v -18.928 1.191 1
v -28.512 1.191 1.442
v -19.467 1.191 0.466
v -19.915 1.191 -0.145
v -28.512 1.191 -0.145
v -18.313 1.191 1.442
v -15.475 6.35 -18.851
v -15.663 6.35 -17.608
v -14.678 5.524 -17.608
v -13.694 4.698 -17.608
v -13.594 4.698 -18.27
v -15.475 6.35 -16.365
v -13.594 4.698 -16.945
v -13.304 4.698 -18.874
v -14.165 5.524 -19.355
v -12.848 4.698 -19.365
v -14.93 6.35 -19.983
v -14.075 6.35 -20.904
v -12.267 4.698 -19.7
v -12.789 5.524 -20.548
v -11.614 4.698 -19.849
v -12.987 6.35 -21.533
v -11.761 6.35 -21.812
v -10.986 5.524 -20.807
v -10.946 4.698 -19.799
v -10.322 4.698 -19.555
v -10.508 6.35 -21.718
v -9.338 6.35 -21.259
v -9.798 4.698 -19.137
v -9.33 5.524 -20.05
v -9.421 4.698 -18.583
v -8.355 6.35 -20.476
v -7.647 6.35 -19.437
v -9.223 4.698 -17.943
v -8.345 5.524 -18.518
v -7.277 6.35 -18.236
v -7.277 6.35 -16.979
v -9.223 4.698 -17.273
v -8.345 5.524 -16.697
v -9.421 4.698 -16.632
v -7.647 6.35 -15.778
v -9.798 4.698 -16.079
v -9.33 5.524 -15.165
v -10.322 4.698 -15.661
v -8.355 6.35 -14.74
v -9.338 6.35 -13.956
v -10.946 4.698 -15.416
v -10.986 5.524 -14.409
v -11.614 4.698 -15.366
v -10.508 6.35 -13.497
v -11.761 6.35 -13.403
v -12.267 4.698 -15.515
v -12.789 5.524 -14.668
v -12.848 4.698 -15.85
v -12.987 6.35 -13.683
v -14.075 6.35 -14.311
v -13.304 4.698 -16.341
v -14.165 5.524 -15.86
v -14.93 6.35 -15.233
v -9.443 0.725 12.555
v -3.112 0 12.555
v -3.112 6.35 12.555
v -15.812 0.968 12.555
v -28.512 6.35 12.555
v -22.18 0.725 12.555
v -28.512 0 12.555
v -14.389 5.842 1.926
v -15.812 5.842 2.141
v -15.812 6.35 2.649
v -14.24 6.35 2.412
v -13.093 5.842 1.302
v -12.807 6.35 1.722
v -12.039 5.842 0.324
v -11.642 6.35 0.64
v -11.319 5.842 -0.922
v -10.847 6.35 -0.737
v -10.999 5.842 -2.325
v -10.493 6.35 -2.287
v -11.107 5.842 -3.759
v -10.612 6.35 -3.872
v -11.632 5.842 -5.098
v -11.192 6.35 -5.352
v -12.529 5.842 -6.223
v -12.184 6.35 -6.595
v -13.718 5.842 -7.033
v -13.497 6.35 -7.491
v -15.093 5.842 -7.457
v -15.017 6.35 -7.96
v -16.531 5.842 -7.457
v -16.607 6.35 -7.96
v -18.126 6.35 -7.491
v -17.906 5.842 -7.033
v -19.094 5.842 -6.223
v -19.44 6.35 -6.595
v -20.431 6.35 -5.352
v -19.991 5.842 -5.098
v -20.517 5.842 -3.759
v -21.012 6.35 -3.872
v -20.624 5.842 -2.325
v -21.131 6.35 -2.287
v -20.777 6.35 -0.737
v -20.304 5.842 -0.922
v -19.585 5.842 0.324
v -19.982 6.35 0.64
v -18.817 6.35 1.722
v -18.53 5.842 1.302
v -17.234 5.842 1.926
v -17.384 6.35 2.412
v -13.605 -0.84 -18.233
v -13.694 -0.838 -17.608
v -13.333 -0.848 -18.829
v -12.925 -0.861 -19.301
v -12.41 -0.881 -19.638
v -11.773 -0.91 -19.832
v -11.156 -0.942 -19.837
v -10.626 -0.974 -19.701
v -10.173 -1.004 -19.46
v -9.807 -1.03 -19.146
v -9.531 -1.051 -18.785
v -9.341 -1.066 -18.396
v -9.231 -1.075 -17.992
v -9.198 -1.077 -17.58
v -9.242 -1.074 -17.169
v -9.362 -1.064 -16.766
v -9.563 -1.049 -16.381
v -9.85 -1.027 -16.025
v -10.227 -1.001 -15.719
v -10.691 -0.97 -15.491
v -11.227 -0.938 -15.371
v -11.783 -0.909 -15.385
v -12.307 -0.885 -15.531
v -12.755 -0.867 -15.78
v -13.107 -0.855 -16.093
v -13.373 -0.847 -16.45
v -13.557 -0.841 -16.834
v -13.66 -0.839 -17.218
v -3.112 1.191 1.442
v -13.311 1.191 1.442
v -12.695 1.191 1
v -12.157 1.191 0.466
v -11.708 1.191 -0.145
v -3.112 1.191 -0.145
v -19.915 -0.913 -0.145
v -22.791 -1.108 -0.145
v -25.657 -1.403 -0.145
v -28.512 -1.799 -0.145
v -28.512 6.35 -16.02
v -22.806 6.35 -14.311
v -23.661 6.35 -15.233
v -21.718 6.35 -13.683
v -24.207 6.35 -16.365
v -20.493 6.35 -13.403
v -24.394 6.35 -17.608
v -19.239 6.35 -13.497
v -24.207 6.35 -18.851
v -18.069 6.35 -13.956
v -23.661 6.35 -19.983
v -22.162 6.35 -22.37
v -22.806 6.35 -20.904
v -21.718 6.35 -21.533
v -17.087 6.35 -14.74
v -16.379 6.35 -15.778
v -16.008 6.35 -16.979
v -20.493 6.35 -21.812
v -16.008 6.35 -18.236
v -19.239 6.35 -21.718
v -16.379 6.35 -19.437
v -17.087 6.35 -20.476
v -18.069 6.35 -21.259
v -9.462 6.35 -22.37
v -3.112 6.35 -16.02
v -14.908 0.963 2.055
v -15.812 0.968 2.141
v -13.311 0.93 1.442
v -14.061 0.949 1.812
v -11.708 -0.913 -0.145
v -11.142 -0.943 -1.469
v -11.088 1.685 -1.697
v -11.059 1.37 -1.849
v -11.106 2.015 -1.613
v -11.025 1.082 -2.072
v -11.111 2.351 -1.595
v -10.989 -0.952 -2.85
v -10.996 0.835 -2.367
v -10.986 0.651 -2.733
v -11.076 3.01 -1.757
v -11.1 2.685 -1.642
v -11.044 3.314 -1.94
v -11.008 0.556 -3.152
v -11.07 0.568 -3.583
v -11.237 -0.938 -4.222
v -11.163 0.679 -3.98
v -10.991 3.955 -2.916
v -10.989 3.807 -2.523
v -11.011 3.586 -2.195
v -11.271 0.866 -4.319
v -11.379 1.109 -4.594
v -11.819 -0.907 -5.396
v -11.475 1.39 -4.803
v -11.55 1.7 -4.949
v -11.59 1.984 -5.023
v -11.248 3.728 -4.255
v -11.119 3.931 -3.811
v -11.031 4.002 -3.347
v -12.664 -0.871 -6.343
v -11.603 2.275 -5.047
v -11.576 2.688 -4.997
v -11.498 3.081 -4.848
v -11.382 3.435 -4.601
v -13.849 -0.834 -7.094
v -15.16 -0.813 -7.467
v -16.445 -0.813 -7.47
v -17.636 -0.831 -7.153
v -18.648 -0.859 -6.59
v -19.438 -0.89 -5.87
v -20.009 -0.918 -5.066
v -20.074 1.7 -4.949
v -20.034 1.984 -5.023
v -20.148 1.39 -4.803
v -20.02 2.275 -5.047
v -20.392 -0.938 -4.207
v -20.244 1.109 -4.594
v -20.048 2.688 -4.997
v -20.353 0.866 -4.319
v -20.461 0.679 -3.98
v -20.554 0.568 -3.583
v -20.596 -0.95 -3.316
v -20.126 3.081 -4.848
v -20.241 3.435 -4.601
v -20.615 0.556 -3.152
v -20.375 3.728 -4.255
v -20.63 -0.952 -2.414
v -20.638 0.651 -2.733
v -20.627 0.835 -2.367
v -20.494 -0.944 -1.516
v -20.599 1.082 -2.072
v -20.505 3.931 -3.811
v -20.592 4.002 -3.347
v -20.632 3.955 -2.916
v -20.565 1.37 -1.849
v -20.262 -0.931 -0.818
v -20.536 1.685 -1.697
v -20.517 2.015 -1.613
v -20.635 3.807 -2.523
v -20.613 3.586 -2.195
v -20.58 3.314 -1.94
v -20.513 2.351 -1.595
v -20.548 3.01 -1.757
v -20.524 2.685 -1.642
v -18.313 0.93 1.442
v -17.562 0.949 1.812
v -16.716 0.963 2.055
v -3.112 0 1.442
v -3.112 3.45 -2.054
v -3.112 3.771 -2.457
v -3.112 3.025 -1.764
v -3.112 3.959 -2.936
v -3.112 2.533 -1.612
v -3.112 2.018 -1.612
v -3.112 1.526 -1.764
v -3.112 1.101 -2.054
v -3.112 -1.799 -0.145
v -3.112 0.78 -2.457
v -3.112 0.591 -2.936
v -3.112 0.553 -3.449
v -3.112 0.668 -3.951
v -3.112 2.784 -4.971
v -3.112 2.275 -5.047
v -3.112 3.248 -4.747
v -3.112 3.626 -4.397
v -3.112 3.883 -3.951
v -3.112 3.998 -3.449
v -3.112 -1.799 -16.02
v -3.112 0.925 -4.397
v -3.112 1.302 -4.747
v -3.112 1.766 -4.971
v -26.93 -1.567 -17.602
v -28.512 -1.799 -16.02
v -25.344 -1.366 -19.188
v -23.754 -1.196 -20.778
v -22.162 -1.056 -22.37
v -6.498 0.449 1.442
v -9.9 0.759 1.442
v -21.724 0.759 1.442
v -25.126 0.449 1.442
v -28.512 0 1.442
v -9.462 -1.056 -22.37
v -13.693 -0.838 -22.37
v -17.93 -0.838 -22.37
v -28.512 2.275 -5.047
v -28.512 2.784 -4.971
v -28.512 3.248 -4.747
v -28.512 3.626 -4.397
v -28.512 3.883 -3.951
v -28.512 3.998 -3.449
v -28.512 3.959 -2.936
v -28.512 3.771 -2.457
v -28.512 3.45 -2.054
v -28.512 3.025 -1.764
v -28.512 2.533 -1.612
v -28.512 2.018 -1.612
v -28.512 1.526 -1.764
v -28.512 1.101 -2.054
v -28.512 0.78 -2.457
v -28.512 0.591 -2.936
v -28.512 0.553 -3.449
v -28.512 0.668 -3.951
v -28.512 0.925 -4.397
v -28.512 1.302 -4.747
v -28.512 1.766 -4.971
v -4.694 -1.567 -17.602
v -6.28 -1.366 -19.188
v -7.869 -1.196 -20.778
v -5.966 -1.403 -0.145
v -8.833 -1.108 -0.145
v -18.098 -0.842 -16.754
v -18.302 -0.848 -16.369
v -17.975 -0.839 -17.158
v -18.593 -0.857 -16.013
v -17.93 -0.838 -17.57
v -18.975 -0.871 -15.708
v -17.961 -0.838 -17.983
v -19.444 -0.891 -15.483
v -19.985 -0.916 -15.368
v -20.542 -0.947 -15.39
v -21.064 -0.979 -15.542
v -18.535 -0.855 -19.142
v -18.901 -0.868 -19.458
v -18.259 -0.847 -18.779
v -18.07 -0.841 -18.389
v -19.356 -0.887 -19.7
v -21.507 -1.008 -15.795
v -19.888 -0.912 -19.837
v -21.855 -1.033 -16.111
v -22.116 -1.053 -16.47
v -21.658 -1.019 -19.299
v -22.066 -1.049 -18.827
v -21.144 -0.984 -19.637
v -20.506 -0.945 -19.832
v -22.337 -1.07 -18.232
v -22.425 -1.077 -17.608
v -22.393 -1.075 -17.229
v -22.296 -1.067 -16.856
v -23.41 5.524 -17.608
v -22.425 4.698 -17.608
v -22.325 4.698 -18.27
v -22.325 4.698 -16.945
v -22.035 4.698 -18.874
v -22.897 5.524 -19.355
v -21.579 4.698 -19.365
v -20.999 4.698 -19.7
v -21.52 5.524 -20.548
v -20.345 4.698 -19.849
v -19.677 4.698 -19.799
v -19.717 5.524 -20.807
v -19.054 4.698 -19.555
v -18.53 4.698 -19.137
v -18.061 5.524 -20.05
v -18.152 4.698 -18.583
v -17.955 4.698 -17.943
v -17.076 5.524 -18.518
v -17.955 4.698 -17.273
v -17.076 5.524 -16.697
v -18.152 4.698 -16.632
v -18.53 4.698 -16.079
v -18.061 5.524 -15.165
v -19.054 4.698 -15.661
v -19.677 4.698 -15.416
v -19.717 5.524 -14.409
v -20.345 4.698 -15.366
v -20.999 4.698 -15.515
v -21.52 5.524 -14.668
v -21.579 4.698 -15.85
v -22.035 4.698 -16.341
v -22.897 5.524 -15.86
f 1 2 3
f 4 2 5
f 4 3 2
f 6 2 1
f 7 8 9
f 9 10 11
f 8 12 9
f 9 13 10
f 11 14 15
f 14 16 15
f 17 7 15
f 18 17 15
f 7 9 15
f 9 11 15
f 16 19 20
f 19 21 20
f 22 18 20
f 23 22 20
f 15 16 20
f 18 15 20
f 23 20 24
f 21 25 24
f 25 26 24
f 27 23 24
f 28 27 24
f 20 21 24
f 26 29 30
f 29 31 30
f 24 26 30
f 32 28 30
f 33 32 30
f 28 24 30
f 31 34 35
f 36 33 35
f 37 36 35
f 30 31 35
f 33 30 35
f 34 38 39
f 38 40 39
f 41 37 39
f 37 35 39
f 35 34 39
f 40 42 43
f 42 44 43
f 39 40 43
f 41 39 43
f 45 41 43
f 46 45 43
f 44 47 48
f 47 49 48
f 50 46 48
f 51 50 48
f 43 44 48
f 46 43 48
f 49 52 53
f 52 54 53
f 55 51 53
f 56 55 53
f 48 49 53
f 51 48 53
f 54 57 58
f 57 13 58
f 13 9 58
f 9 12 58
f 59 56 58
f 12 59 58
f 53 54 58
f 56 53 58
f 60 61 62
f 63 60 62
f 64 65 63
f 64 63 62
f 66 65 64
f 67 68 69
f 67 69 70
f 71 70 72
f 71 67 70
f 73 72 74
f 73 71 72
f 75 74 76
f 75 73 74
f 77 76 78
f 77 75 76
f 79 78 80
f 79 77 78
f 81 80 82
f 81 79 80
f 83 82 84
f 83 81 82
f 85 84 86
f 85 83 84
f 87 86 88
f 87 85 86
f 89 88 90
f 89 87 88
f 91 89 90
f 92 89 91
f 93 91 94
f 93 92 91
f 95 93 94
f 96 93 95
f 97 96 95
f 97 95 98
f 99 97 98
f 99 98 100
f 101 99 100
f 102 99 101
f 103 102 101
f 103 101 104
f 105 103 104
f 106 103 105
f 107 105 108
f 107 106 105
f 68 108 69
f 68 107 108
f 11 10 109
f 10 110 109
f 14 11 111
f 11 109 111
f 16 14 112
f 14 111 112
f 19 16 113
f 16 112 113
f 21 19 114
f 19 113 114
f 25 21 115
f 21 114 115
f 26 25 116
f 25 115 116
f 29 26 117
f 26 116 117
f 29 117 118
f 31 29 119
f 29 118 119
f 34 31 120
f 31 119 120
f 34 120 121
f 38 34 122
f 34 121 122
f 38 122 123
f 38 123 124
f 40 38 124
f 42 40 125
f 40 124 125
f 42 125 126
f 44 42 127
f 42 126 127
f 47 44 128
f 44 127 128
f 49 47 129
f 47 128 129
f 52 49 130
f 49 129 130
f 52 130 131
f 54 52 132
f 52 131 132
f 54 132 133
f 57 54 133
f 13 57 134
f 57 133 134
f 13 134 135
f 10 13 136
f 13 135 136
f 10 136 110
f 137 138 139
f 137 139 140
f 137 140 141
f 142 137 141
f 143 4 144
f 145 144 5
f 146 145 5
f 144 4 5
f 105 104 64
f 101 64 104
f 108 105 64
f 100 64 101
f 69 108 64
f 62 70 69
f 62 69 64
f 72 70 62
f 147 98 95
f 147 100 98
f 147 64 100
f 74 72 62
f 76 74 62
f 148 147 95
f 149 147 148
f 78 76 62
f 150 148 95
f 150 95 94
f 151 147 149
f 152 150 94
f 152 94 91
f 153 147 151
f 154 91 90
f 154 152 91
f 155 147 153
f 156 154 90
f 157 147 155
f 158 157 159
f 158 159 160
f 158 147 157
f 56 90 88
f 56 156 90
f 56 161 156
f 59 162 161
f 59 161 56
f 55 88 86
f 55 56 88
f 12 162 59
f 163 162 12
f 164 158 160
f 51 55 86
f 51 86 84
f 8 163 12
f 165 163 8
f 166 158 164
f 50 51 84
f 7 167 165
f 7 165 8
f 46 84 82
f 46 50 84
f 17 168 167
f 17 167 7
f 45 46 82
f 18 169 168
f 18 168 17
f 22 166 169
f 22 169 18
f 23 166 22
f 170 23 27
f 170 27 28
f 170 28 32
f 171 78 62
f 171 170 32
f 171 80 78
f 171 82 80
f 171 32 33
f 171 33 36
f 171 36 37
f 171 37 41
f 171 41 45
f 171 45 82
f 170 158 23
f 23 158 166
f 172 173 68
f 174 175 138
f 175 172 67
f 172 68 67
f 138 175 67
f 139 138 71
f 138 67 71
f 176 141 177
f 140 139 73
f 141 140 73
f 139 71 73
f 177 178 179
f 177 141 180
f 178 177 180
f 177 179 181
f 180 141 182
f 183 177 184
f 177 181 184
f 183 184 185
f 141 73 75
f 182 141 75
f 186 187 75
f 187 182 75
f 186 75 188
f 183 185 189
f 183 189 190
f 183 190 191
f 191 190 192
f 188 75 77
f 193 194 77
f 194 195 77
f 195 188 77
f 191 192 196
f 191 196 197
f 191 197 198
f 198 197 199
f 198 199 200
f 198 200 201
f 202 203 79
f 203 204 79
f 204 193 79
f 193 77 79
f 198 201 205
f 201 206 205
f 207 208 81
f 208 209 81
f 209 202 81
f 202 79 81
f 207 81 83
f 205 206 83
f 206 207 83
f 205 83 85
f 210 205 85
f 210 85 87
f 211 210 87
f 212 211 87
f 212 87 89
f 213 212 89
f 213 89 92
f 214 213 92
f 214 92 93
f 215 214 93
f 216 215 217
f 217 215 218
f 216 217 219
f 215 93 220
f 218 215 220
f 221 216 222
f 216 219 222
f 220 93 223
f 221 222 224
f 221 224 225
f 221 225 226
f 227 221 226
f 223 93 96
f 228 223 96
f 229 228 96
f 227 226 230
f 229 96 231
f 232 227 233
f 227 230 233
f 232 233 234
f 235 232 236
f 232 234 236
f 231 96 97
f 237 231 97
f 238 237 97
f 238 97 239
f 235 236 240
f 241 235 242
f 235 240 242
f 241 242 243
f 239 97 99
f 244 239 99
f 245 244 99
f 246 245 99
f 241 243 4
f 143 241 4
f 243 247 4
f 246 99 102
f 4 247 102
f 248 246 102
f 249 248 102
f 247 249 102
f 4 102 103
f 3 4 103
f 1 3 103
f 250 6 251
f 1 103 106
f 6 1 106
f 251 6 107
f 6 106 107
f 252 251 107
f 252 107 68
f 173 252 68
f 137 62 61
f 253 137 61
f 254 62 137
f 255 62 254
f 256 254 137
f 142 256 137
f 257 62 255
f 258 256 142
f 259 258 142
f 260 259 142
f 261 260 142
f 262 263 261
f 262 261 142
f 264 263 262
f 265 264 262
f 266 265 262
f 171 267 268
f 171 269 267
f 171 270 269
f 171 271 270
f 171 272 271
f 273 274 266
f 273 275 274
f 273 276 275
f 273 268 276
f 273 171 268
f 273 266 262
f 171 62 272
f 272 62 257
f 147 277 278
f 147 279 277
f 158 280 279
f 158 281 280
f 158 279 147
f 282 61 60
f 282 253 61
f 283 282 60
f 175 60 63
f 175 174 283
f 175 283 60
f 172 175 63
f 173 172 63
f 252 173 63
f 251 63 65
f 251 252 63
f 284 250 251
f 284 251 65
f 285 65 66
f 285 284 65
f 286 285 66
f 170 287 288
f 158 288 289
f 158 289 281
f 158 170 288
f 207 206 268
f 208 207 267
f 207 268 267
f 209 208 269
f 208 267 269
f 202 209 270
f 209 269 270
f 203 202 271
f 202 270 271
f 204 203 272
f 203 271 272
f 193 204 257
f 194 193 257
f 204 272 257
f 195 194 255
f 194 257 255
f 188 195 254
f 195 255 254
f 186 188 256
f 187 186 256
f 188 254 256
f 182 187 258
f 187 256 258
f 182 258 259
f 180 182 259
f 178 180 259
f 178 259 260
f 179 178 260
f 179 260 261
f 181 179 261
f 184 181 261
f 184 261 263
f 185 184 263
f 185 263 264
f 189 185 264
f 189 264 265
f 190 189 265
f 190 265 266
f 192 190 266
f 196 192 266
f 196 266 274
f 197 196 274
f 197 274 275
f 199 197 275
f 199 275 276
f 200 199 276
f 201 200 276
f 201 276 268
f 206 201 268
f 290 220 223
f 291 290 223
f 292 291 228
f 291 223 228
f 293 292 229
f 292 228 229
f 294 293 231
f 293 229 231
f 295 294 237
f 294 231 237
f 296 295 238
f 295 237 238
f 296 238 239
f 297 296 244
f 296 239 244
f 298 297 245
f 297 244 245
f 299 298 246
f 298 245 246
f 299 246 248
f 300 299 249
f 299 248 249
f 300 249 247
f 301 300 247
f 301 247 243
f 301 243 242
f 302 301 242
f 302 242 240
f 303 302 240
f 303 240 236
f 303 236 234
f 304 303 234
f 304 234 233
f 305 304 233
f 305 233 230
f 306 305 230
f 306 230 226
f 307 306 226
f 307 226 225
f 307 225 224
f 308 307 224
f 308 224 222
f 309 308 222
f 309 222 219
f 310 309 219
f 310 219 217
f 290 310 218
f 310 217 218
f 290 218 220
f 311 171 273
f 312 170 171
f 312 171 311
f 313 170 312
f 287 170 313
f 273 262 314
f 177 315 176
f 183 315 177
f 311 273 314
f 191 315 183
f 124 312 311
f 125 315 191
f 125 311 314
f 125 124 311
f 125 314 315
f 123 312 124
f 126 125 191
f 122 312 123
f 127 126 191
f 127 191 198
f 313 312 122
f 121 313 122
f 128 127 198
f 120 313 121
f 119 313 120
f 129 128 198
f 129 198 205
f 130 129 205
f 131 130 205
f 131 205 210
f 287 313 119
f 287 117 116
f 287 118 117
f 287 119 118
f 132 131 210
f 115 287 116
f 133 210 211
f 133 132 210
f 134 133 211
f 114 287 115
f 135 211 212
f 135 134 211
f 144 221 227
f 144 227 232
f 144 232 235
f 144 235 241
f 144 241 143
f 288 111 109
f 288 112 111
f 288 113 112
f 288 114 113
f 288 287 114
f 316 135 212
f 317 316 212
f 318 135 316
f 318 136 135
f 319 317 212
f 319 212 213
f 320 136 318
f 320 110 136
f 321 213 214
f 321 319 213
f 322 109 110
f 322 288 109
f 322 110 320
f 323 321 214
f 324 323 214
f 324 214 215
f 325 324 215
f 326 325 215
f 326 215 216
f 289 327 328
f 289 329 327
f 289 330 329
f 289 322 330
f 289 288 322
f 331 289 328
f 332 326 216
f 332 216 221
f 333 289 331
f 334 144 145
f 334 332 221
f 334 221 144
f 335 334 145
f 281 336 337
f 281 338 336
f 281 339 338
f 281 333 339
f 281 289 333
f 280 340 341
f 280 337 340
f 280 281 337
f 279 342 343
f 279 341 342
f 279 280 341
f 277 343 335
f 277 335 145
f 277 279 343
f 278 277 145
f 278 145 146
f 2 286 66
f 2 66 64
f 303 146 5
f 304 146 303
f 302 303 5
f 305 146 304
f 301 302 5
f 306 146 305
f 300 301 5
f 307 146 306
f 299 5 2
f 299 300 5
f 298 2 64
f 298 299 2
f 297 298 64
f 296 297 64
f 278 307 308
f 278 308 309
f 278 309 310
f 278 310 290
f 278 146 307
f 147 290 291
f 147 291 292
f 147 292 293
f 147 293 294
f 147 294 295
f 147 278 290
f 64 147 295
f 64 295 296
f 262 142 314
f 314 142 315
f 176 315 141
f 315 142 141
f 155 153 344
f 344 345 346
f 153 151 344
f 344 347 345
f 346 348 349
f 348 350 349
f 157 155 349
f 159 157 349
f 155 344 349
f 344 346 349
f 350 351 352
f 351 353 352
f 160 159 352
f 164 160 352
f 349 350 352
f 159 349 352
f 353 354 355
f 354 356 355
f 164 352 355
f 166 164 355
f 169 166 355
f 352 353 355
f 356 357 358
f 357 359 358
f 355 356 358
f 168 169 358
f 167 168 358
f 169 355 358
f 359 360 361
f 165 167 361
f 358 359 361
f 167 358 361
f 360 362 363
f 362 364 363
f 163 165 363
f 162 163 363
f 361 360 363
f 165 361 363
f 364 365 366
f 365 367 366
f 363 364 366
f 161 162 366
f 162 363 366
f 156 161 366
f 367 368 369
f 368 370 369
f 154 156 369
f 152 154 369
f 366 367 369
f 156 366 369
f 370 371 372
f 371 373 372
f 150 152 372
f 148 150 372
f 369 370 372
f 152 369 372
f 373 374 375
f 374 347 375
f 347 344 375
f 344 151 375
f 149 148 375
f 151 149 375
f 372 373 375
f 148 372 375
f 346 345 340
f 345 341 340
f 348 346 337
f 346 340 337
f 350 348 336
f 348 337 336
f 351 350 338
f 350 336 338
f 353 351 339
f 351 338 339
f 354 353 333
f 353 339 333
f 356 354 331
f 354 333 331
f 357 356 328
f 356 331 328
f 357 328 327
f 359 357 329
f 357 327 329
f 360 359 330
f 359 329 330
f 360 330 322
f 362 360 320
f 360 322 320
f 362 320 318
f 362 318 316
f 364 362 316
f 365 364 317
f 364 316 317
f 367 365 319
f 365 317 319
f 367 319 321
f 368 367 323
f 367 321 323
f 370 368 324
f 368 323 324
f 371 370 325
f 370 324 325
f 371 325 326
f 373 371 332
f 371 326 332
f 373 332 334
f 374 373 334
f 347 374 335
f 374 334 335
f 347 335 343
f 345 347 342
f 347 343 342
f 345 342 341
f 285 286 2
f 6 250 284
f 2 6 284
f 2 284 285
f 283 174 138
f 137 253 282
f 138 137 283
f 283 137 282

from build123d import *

# Parameters (mm, degrees)
BOSS_EXTRUDE1_DEPTH                               = 6.35
CUT_EXTRUDE1_DEPTH                                = 46.530235335
CUT_EXTRUDE1_DEPTH_BACK                           = 46.530235335
SKETCH2_R                                         = 83.82
BOSS_EXTRUDE2_DEPTH                               = 22.225
CHAMFER1_SIZE                                     = 6.35
CSK_FOR_8_FLAT_HEAD_MACHINE_SCREW_100_D           = 4.4958
CSK_FOR_8_FLAT_HEAD_MACHINE_SCREW_100_CSINK_D     = 8.4328
CSK_FOR_8_FLAT_HEAD_MACHINE_SCREW_100_CSINK_ANGLE = 100
SKETCH6_R                                         = 1.524
CUT_EXTRUDE2_DEPTH                                = 38.145162749
SKETCH7_W                                         = 1.5875
SKETCH7_H                                         = 2.989850087
CUT_EXTRUDE3_DEPTH                                = 35.437066375
SKETCH8_R                                         = 4.826
CUT_EXTRUDE4_DEPTH                                = 38.145162749
CHAMFER2_SIZE                                     = 0.508
F_8_32_TAPPED_HOLE1_D                             = 3.4544


with BuildPart() as part:
    # Sketch1 → Boss-Extrude1 (new body)
    with BuildSketch(Plane(origin=(0, 0, 0), x_dir=(1, 0, 0), z_dir=(0, 1, 0))):
        Polygon((-28.511825699, 16.020271113), (-22.161825699, 22.370271113), (-9.461825699, 22.370271113), (-3.111825699, 16.020271113), (-3.111825699, -12.554728887), (-28.511825699, -12.554728887), align=None)
    extrude(amount=BOSS_EXTRUDE1_DEPTH)

    # Sketch2 → Cut-Extrude1 (cut, two sides: drawn at the far end of the back side and taken through both)
    with BuildSketch(Plane.XY.offset(12.554728887).offset(-CUT_EXTRUDE1_DEPTH_BACK)):
        with Locations((-15.811825699, -82.852292666)):
            Circle(SKETCH2_R)
    extrude(amount=CUT_EXTRUDE1_DEPTH + CUT_EXTRUDE1_DEPTH_BACK, mode=Mode.SUBTRACT)

    # Sketch5 → Boss-Extrude2 (add)
    with BuildSketch(Plane(origin=(0, 0, -22.370271113), x_dir=(-1, 0, 0), z_dir=(0, 0, -1))):
        with BuildLine():
            Line((3.111825699, 6.35), (3.111825699, 0))
            Line((3.111825699, 0), (3.111825699, -1.799225087))
            ThreePointArc((3.111825699, -1.799225087), (15.811825699, -0.810292666), (28.511825699, -1.799225087))
            Line((28.511825699, -1.799225087), (28.511825699, 0))
            Line((28.511825699, 0), (28.511825699, 6.35))
            Line((28.511825699, 6.35), (3.111825699, 6.35))
        make_face()
    extrude(amount=-BOSS_EXTRUDE2_DEPTH)

    # Chamfer1
    chamfer1_edges = [part.edges().sort_by_distance(p)[0] for p in [
        (-3.111825699, 2.275387457, -22.370271113),
        (-28.511825699, 2.275387457, -22.370271113),
    ]]
    chamfer(chamfer1_edges, length=CHAMFER1_SIZE)

    # CSK for #8 Flat Head Machine Screw (100)1 (through all)
    with Locations(Plane(origin=(0, 6.35, 0), x_dir=(1, 0, 0), z_dir=(0, 1, 0))):
        with Locations((-20.177450699, 17.607771113), (-11.446200699, 17.607771113)):
            CounterSinkHole(CSK_FOR_8_FLAT_HEAD_MACHINE_SCREW_100_D / 2, CSK_FOR_8_FLAT_HEAD_MACHINE_SCREW_100_CSINK_D / 2, counter_sink_angle=CSK_FOR_8_FLAT_HEAD_MACHINE_SCREW_100_CSINK_ANGLE)

    # Sketch6 → Cut-Extrude2 (cut, through all)
    with BuildSketch(Plane(origin=(0, 6.35, 0), x_dir=(1, 0, 0), z_dir=(0, 1, 0))):
        with Locations(Location((-15.811825699, 2.685271113, 0), (0, 0, 270))):
            Circle(SKETCH6_R)
    extrude(amount=-CUT_EXTRUDE2_DEPTH, mode=Mode.SUBTRACT)

    # Sketch7 → Cut-Extrude3 (cut, through all)
    with BuildSketch(Plane(origin=(-3.111825699, 0, 0), x_dir=(0, 0, -1), z_dir=(1, 0, 0))):
        with Locations((-0.648478887, -0.304300044)):
            Rectangle(SKETCH7_W, SKETCH7_H)
    extrude(amount=-CUT_EXTRUDE3_DEPTH, mode=Mode.SUBTRACT)

    # Sketch8 → Cut-Extrude4 (cut, through all)
    with BuildSketch(Plane(origin=(0, 6.35, 0), x_dir=(1, 0, 0), z_dir=(0, 1, 0))):
        with Locations(Location((-15.811825699, 2.685271113, 0), (0, 0, 270))):
            Circle(SKETCH8_R)
    extrude(amount=-CUT_EXTRUDE4_DEPTH, mode=Mode.SUBTRACT)

    # Chamfer2
    chamfer2_edges = [part.edges().sort_by_distance(p)[0] for p in [
        (-15.811825699, 6.35, -7.511271113),
    ]]
    chamfer(chamfer2_edges, length=CHAMFER2_SIZE)

    # #8-32 Tapped Hole1 (through all)
    with Locations(Plane.ZY.offset(28.511825699)):
        with Locations((-3.320271113, 2.275387457)):
            Hole(F_8_32_TAPPED_HOLE1_D / 2)


solid = part.part
